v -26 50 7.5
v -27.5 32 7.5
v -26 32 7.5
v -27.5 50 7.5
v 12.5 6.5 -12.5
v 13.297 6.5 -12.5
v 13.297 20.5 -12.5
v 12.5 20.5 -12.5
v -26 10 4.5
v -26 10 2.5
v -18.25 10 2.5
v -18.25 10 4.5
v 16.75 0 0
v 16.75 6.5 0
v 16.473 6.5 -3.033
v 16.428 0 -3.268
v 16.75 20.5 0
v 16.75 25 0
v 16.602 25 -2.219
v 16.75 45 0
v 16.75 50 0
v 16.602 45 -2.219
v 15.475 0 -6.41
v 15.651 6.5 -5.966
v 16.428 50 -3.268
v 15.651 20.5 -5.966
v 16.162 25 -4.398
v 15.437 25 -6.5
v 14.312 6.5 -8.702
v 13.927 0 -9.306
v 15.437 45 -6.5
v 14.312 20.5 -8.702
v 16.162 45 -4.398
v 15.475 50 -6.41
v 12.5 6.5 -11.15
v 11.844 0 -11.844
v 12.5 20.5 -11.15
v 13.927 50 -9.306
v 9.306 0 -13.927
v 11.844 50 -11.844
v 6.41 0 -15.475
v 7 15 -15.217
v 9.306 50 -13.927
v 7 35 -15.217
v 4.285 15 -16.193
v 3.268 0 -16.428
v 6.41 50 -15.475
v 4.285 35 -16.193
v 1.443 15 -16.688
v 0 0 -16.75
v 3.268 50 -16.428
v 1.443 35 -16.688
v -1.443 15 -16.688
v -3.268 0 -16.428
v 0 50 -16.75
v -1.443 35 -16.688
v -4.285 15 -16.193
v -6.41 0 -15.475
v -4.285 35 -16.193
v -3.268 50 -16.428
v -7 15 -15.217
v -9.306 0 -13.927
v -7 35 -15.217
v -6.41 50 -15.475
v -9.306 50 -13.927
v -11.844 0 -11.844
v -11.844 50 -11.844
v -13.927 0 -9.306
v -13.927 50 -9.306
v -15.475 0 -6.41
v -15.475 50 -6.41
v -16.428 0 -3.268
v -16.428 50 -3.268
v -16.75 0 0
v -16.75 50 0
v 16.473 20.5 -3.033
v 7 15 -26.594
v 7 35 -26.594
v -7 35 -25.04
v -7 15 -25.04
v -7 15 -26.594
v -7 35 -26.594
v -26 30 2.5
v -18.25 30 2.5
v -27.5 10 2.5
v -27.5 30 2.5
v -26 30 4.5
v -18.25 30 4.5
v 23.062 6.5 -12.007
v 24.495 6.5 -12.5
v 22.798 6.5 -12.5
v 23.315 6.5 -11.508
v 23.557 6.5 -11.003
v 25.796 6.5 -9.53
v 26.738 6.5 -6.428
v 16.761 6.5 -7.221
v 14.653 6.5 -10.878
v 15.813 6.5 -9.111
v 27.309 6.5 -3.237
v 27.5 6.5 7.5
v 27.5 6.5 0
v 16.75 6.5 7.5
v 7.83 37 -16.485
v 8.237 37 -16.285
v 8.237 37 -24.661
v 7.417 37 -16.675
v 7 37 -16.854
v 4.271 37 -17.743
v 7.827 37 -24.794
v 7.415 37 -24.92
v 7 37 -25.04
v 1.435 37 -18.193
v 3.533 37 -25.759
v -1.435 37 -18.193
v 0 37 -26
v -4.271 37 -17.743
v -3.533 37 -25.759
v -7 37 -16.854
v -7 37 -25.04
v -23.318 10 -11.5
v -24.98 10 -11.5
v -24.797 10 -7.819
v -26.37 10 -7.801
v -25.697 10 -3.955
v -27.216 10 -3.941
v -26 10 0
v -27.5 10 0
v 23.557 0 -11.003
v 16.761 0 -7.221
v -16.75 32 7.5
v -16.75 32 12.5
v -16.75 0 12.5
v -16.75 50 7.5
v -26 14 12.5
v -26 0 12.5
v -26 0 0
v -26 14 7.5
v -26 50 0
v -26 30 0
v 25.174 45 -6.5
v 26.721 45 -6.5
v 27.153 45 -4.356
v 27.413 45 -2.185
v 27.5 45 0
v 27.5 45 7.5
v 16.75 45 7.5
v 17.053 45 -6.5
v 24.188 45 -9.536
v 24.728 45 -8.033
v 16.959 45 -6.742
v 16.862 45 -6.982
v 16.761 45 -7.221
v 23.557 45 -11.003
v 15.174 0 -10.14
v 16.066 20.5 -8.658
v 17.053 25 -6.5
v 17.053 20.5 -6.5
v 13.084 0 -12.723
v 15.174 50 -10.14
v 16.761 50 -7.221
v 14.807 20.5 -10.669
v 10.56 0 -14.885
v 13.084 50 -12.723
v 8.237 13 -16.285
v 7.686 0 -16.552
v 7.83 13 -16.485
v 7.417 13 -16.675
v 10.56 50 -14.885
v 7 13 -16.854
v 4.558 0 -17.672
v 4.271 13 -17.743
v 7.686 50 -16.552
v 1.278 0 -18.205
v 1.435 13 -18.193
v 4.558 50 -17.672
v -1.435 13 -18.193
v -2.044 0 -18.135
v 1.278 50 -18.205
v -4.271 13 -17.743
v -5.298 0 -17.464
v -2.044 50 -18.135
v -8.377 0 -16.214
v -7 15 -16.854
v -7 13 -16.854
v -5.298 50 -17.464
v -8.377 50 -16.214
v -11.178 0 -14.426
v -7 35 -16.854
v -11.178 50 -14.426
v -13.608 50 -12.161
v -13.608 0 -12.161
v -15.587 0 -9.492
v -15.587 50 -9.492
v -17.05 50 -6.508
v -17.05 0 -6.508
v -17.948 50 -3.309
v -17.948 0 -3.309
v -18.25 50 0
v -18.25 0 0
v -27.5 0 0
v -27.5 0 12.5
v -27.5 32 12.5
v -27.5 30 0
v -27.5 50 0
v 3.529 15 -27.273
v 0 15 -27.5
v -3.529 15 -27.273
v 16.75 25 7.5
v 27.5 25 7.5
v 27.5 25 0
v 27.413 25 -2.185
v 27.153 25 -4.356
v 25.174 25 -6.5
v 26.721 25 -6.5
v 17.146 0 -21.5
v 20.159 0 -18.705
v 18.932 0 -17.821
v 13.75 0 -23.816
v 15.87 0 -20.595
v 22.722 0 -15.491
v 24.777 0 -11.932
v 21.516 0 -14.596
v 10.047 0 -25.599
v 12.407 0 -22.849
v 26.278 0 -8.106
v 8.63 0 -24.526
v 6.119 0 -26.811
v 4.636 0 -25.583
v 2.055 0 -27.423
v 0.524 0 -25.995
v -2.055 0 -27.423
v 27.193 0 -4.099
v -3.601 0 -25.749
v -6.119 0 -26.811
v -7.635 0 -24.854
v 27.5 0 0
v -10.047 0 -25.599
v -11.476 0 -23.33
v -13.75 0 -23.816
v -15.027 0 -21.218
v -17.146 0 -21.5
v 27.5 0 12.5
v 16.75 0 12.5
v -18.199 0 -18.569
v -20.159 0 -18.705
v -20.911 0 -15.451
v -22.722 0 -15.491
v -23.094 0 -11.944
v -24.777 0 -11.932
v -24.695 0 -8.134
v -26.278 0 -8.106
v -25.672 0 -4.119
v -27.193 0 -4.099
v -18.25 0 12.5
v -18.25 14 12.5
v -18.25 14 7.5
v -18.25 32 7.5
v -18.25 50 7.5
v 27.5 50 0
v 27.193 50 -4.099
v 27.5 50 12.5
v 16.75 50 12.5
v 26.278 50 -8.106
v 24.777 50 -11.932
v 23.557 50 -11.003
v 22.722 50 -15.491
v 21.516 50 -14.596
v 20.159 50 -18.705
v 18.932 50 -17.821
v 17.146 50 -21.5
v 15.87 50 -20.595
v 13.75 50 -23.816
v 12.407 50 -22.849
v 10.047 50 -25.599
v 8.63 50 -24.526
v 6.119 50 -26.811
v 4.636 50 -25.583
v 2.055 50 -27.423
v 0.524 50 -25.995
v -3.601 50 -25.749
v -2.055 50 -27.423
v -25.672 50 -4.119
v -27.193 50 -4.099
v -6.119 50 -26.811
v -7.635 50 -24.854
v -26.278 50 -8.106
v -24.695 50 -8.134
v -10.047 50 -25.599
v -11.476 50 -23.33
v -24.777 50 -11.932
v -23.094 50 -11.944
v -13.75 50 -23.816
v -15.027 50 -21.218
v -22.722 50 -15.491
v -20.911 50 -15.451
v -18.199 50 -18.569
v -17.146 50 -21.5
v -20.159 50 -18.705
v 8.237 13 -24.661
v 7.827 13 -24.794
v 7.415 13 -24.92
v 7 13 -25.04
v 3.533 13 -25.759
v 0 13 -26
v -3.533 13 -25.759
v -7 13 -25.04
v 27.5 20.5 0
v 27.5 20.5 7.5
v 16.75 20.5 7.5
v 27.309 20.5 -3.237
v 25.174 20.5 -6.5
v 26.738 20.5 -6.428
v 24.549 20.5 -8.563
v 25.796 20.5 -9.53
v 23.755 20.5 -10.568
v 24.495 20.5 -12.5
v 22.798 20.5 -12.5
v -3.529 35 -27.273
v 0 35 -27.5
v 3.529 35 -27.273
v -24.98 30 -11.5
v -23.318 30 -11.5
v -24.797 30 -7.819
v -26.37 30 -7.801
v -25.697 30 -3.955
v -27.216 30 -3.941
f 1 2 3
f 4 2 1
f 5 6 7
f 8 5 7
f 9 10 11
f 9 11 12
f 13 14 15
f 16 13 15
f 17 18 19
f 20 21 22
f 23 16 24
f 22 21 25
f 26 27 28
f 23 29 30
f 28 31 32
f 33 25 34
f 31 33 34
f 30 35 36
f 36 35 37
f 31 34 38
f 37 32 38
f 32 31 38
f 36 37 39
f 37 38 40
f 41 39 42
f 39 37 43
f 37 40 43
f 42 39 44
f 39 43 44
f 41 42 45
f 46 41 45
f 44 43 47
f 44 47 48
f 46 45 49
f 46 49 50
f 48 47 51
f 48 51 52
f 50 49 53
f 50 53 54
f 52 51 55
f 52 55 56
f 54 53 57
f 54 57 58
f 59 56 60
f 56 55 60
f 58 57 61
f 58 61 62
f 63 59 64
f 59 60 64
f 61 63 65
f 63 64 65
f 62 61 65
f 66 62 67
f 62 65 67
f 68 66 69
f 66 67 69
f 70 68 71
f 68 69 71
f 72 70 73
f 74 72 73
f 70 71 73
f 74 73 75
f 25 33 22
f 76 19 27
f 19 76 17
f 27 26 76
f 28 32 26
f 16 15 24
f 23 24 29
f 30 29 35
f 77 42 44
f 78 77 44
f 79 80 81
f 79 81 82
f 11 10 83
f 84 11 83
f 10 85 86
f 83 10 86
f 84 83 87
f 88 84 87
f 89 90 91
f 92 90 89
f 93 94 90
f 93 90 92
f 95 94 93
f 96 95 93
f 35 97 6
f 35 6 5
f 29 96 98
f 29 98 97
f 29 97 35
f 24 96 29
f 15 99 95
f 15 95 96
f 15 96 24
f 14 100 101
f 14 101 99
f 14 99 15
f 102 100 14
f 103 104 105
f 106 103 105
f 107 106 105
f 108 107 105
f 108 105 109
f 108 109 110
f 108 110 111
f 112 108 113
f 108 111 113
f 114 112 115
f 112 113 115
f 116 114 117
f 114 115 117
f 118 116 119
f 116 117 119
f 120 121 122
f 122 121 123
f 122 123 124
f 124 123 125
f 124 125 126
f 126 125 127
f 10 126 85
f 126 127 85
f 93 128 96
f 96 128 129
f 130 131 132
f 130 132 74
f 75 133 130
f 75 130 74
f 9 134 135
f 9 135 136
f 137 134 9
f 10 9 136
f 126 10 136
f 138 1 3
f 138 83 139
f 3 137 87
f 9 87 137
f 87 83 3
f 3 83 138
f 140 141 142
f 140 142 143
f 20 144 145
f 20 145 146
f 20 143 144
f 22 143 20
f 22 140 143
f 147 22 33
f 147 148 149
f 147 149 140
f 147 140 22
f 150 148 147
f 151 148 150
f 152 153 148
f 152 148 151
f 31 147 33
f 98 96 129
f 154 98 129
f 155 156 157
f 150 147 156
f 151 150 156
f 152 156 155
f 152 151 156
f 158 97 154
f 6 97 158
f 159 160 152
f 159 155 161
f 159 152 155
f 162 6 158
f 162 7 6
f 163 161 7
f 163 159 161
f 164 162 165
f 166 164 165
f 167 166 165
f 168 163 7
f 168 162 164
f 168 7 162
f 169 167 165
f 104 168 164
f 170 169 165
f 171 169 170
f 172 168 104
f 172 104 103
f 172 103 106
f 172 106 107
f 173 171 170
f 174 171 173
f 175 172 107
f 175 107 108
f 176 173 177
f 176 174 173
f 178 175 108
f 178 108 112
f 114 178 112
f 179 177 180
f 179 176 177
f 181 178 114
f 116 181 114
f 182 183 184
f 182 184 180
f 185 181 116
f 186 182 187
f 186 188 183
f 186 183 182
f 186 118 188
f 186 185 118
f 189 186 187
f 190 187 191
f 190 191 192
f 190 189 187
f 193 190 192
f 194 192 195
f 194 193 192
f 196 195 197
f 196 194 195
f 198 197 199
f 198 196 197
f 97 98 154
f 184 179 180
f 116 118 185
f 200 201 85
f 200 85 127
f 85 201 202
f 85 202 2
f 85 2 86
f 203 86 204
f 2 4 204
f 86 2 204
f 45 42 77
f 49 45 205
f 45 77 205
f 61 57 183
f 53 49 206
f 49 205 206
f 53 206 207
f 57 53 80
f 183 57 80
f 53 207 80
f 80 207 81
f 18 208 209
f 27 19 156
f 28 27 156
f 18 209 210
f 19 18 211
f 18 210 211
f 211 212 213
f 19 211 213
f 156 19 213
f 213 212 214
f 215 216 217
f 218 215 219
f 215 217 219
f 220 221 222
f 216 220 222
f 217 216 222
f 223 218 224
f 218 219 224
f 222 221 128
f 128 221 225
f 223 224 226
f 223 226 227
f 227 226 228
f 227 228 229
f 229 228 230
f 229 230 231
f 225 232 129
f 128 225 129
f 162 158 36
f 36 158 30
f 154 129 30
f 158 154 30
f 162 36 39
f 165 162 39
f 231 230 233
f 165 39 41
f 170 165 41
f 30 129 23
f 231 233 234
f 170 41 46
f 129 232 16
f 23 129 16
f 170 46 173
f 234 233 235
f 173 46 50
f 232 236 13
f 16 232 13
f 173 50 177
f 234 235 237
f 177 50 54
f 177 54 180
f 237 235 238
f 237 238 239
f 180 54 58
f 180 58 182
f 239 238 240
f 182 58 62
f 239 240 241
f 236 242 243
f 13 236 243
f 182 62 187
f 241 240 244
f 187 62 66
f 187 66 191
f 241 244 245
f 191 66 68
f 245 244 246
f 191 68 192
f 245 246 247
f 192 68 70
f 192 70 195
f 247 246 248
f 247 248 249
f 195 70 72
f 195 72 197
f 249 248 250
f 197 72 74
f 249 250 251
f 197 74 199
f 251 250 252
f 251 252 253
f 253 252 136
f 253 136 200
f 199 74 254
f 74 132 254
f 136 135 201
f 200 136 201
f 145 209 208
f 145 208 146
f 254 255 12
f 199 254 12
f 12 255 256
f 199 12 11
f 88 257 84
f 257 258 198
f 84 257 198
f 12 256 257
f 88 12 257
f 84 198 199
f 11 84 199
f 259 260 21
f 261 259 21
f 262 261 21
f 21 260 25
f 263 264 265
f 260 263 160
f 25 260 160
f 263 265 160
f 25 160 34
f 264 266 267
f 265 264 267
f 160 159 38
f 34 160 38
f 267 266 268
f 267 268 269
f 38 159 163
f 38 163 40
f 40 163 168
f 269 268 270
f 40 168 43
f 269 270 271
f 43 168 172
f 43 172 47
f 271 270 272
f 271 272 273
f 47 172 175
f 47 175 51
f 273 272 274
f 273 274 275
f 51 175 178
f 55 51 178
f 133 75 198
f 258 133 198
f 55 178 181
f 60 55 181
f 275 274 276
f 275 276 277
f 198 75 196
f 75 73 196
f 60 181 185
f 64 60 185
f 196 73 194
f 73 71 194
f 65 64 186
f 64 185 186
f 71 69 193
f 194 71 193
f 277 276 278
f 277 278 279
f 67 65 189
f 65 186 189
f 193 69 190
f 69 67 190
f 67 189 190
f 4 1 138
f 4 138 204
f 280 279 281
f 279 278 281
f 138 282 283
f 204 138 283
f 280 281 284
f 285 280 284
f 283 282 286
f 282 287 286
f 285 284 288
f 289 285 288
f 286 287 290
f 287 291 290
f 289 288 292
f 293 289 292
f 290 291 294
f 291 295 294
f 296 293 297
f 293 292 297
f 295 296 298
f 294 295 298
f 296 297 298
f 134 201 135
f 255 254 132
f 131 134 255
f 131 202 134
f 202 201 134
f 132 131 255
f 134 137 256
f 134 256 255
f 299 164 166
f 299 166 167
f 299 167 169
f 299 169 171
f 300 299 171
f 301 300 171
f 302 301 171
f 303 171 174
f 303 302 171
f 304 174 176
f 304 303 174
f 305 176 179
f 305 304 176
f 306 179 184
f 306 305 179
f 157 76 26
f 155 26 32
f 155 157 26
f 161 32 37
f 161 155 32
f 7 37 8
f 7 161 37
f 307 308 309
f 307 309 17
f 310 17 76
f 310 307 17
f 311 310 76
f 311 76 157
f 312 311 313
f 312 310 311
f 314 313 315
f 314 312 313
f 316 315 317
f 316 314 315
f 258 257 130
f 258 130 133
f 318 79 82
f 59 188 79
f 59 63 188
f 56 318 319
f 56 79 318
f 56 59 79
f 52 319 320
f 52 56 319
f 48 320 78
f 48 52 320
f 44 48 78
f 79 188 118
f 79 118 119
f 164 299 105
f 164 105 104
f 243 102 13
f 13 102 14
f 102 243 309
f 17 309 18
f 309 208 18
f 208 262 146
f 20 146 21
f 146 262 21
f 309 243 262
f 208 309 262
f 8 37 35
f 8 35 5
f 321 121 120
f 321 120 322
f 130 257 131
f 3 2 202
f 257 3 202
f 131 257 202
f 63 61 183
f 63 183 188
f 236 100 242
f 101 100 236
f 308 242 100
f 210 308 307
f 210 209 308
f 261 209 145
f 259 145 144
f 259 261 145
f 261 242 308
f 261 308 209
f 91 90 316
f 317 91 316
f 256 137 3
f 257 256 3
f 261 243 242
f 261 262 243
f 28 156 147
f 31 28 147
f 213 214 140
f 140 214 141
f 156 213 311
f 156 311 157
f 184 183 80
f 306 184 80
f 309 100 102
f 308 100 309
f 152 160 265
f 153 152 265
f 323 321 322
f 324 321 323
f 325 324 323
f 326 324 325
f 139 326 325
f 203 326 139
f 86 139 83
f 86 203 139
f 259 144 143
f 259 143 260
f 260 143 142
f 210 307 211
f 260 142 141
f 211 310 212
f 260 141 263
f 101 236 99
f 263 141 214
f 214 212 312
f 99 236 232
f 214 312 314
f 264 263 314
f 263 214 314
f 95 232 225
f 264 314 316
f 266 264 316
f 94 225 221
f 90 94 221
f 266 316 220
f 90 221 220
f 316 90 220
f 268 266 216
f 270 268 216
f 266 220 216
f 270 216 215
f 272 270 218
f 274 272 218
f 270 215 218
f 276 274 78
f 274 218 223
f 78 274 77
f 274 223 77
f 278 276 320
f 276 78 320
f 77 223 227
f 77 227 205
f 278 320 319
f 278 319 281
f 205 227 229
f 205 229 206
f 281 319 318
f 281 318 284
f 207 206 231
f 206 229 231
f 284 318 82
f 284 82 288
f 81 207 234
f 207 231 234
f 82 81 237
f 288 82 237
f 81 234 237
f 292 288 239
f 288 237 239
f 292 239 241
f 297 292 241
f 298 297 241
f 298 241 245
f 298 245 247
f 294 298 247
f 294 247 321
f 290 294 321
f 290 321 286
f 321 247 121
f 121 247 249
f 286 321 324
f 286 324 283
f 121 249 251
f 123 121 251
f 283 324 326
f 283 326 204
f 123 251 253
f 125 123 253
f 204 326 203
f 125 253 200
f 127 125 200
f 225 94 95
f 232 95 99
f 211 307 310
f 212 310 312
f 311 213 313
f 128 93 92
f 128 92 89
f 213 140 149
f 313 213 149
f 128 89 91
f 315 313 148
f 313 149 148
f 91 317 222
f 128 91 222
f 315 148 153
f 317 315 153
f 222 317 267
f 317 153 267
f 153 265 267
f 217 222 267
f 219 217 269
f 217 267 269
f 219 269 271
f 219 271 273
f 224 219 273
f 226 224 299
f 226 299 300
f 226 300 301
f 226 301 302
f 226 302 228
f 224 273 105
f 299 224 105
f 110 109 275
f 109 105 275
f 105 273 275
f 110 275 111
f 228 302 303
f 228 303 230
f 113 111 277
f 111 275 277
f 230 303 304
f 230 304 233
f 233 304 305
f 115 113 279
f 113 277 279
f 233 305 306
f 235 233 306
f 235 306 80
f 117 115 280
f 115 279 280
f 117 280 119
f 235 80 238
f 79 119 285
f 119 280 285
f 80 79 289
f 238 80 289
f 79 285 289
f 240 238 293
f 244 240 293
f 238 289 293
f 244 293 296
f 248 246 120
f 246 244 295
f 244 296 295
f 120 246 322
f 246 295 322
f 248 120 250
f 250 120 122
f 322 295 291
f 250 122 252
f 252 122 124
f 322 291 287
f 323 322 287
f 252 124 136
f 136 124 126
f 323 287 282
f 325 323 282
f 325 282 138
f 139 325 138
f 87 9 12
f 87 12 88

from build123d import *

# Parameters (mm, degrees)
SKETCH2_R            = 27.5
BOSS_EXTRUDE1_DEPTH  = 50
SKETCH3_R            = 26
CUT_EXTRUDE1_DEPTH   = 51
SKETCH7_R            = 18.25
BOSS_EXTRUDE3_DEPTH  = 50
SKETCH8_R            = 16.75
CUT_EXTRUDE3_DEPTH   = 51
SKETCH9_W            = 59.961193285
SKETCH9_H            = 28.516087398
CUT_EXTRUDE4_DEPTH   = 51
SKETCH10_W           = 1.5
SKETCH10_H           = 12.5
BOSS_EXTRUDE4_DEPTH  = 50
BOSS_EXTRUDE5_DEPTH  = 5
BOSS_EXTRUDE6_DEPTH  = 6.5
SKETCH12_W           = 14
SKETCH12_H           = 20
SKETCH12_W_2         = 20
SKETCH12_H_2         = 14
CUT_EXTRUDE6_DEPTH   = 15
SKETCH14_W           = 14
SKETCH14_H           = 20
CUT_EXTRUDE7_DEPTH   = 45
SKETCH15_W           = 16.605878589
SKETCH15_H           = 22.2356131
CUT_EXTRUDE8_DEPTH   = 15
BOSS_EXTRUDE8_DEPTH  = 4.5
BOSS_EXTRUDE9_DEPTH  = 2
BOSS_EXTRUDE10_DEPTH = 2
BOSS_EXTRUDE15_DEPTH = 24
BOSS_EXTRUDE17_DEPTH = 10
SKETCH26_W           = 5
SKETCH26_H           = 18
BOSS_EXTRUDE18_DEPTH = 10
SKETCH27_W           = 7.75
SKETCH27_H           = 14
BOSS_EXTRUDE19_DEPTH = 5
SKETCH29_W           = 14
SKETCH29_H           = 20
CUT_EXTRUDE9_DEPTH   = 8
SKETCH30_W           = 2
SKETCH30_H           = 20
BOSS_EXTRUDE20_DEPTH = 10


with BuildPart() as part:
    # Sketch2 → Boss-Extrude1 (new body)
    with BuildSketch(Plane(origin=(0, 0, 0), x_dir=(1, 0, 0), z_dir=(0, 1, 0))):
        Circle(SKETCH2_R)
    extrude(amount=BOSS_EXTRUDE1_DEPTH)

    # Sketch3 → Cut-Extrude1 (cut, through all)
    with BuildSketch(Plane(origin=(0, 50, 0), x_dir=(1, 0, 0), z_dir=(0, 1, 0))):
        Circle(SKETCH3_R)
    extrude(amount=-CUT_EXTRUDE1_DEPTH, mode=Mode.SUBTRACT)


with BuildPart() as body_2:
    # Sketch7 → Boss-Extrude3 (new body)
    with BuildSketch(Plane(origin=(0, 50, 0), x_dir=(1, 0, 0), z_dir=(0, 1, 0))):
        Circle(SKETCH7_R)
    extrude(amount=-BOSS_EXTRUDE3_DEPTH)

    # Sketch8 → Cut-Extrude3 (cut, through all)
    with BuildSketch(Plane(origin=(0, 50, 0), x_dir=(1, 0, 0), z_dir=(0, 1, 0))):
        Circle(SKETCH8_R)
    extrude(amount=-CUT_EXTRUDE3_DEPTH, mode=Mode.SUBTRACT)


with BuildPart() as cut_extrude4_tool:
    # Sketch9 → Cut-Extrude4 (new body, through all)
    with BuildSketch(Plane(origin=(0, 50, 0), x_dir=(1, 0, 0), z_dir=(0, 1, 0))):
        with Locations((-0.477134602, -14.258043699)):
            Rectangle(SKETCH9_W, SKETCH9_H)
    extrude(amount=-CUT_EXTRUDE4_DEPTH)


with BuildPart() as part_1:
    add(part.part)

    # Cut-Extrude4: cut by cut_extrude4_tool
    add(cut_extrude4_tool.part, mode=Mode.SUBTRACT)



with BuildPart() as body_2_1:
    add(body_2.part)

    # Cut-Extrude4: cut by cut_extrude4_tool
    add(cut_extrude4_tool.part, mode=Mode.SUBTRACT)


with BuildPart() as part_2:
    add(part_1.part)

    add(body_2_1.part)  # Boss-Extrude4 merges body 2
    # Sketch10 → Boss-Extrude4 (add)
    with BuildSketch(Plane(origin=(0, 50, 0), x_dir=(1, 0, 0), z_dir=(0, 1, 0))):
        with Locations((-26.75, -6.25)):
            Rectangle(SKETCH10_W, SKETCH10_H)
        with Locations((-17.5, -6.25)):
            Rectangle(SKETCH10_W, SKETCH10_H)
        with Locations((17.5, -6.25)):
            Rectangle(SKETCH10_W, SKETCH10_H)
        with Locations((26.75, -6.25)):
            Rectangle(SKETCH10_W, SKETCH10_H)
    extrude(amount=-BOSS_EXTRUDE4_DEPTH)

    # Sketch11 → Boss-Extrude5 (add)
    with BuildSketch(Plane(origin=(0, 50, 0), x_dir=(1, 0, 0), z_dir=(0, 1, 0))):
        with BuildLine():
            Line((16.760723177, 7.220848882), (23.556882961, 11.003329731))
            ThreePointArc((23.556882961, 11.003329731), (25.38187303, 5.63564739), (26, 0))
            Line((26, 0), (26, -12.5))
            Line((26, -12.5), (18.25, -12.5))
            Line((18.25, -12.5), (18.25, 0))
            ThreePointArc((18.25, 0), (17.873803428, 3.686414384), (16.760723177, 7.220848882))
        make_face()
    extrude(amount=-BOSS_EXTRUDE5_DEPTH)

    # Sketch13 → Boss-Extrude6 (add)
    with BuildSketch(Plane.XZ):
        with BuildLine():
            Line((18.25, 0), (18.25, 12.5))
            Line((18.25, 12.5), (26, 12.5))
            Line((26, 12.5), (26, 0))
            ThreePointArc((26, 0), (25.38187303, -5.63564739), (23.556882961, -11.003329731))
            Line((23.556882961, -11.003329731), (16.760723177, -7.220848882))
            ThreePointArc((16.760723177, -7.220848882), (17.873803428, -3.686414384), (18.25, 0))
        make_face()
    extrude(amount=-BOSS_EXTRUDE6_DEPTH)

    # Sketch12 → Cut-Extrude6 (cut)
    with BuildSketch(Plane(origin=(27.5, 0, 0), x_dir=(0, 0, -1), z_dir=(1, 0, 0))):
        with Locations((-0.5, 35)):
            Rectangle(SKETCH12_W, SKETCH12_H)
        with Locations((2.5, 13.5)):
            Rectangle(SKETCH12_W_2, SKETCH12_H_2)
    extrude(amount=-CUT_EXTRUDE6_DEPTH, mode=Mode.SUBTRACT)

    # Sketch14 → Cut-Extrude7 (cut)
    with BuildSketch(Plane.XY.offset(12.5)):
        with Locations((0, 25)):
            Rectangle(SKETCH14_W, SKETCH14_H)
    extrude(amount=-CUT_EXTRUDE7_DEPTH, mode=Mode.SUBTRACT)

    # Sketch15 → Cut-Extrude8 (cut)
    with BuildSketch(Plane.ZY.offset(27.5)):
        with Locations((15.802939295, 43.11780655)):
            Rectangle(SKETCH15_W, SKETCH15_H)
    extrude(amount=-CUT_EXTRUDE8_DEPTH, mode=Mode.SUBTRACT)

    # Sketch17 → Boss-Extrude8 (add)
    with BuildSketch(Plane(origin=(0, 25, 0), x_dir=(1, 0, 0), z_dir=(0, 1, 0))):
        with BuildLine():
            Line((26.720778432, 6.5), (17.053225501, 6.5))
            ThreePointArc((17.053225501, 6.5), (17.948312809, 3.304628164), (18.25, 0))
            Line((18.25, 0), (18.25, -7.5))
            Line((18.25, -7.5), (27.5, -7.5))
            Line((27.5, -7.5), (27.5, 0))
            ThreePointArc((27.5, 0), (27.304499692, 3.273270011), (26.720778432, 6.5))
        make_face()
    extrude(amount=-BOSS_EXTRUDE8_DEPTH)

    # Sketch18 → Boss-Extrude9 (add)
    with BuildSketch(Plane.XZ.offset(-35)):
        with BuildLine():
            Line((-7, -16.854153791), (-7, -25.039968051))
            ThreePointArc((-7, -25.039968051), (0, -26), (7, -25.039968051))
            Line((7, -25.039968051), (7, -16.854153791))
            ThreePointArc((7, -16.854153791), (0, -18.25), (-7, -16.854153791))
        make_face()
    extrude(amount=-BOSS_EXTRUDE9_DEPTH)

    # Sketch19 → Boss-Extrude10 (add)
    with BuildSketch(Plane(origin=(0, 15, 0), x_dir=(1, 0, 0), z_dir=(0, 1, 0))):
        with BuildLine():
            Line((7, 25.039968051), (7, 16.854153791))
            ThreePointArc((7, 16.854153791), (0, 18.25), (-7, 16.854153791))
            Line((-7, 16.854153791), (-7, 25.039968051))
            ThreePointArc((-7, 25.039968051), (0, 26), (7, 25.039968051))
        make_face()
    extrude(amount=-BOSS_EXTRUDE10_DEPTH)

    # Sketch24 → Boss-Extrude15 (add)
    with BuildSketch(Plane(origin=(0, 37, 0), x_dir=(1, 0, 0), z_dir=(0, 1, 0))):
        with BuildLine():
            Line((8.237316258, 24.660628963), (8.237316258, 16.285242426))
            ThreePointArc((8.237316258, 16.285242426), (7.6239666, 16.581243418), (7, 16.854153791))
            Line((7, 16.854153791), (7, 25.039968051))
            ThreePointArc((7, 25.039968051), (7.621018713, 24.857998185), (8.237316258, 24.660628963))
        make_face()
    extrude(amount=-BOSS_EXTRUDE15_DEPTH)

    # Sketch25 → Boss-Extrude17 (add)
    with BuildSketch(Plane(origin=(27.5, 0, 0), x_dir=(0, 0, -1), z_dir=(1, 0, 0))):
        Polygon((-7.5, 45), (-12.5, 45), (-12.5, 25), (-12.5, 20.5), (-7.5, 20.5), (-7.5, 25), align=None)
    extrude(amount=-BOSS_EXTRUDE17_DEPTH)

    # Sketch26 → Boss-Extrude18 (add)
    with BuildSketch(Plane.ZY.offset(27.5)):
        with Locations((10, 23)):
            Rectangle(SKETCH26_W, SKETCH26_H)
    extrude(amount=-BOSS_EXTRUDE18_DEPTH)

    # Sketch27 → Boss-Extrude19 (add)
    with BuildSketch(Plane.XY.offset(12.5)):
        with Locations((22.125, 13.5)):
            Rectangle(SKETCH27_W, SKETCH27_H)
    extrude(amount=-BOSS_EXTRUDE19_DEPTH)

    # Sketch29 → Cut-Extrude9 (cut)
    with BuildSketch(Plane.ZY.offset(27.5)):
        with Locations((-4.5, 20)):
            Rectangle(SKETCH29_W, SKETCH29_H)
    extrude(amount=-CUT_EXTRUDE9_DEPTH, mode=Mode.SUBTRACT)

    # Sketch30 → Boss-Extrude20 (add)
    with BuildSketch(Plane.ZY.offset(27.5)):
        with Locations((3.5, 20)):
            Rectangle(SKETCH30_W, SKETCH30_H)
    extrude(amount=-BOSS_EXTRUDE20_DEPTH)


solid = part_2.part
